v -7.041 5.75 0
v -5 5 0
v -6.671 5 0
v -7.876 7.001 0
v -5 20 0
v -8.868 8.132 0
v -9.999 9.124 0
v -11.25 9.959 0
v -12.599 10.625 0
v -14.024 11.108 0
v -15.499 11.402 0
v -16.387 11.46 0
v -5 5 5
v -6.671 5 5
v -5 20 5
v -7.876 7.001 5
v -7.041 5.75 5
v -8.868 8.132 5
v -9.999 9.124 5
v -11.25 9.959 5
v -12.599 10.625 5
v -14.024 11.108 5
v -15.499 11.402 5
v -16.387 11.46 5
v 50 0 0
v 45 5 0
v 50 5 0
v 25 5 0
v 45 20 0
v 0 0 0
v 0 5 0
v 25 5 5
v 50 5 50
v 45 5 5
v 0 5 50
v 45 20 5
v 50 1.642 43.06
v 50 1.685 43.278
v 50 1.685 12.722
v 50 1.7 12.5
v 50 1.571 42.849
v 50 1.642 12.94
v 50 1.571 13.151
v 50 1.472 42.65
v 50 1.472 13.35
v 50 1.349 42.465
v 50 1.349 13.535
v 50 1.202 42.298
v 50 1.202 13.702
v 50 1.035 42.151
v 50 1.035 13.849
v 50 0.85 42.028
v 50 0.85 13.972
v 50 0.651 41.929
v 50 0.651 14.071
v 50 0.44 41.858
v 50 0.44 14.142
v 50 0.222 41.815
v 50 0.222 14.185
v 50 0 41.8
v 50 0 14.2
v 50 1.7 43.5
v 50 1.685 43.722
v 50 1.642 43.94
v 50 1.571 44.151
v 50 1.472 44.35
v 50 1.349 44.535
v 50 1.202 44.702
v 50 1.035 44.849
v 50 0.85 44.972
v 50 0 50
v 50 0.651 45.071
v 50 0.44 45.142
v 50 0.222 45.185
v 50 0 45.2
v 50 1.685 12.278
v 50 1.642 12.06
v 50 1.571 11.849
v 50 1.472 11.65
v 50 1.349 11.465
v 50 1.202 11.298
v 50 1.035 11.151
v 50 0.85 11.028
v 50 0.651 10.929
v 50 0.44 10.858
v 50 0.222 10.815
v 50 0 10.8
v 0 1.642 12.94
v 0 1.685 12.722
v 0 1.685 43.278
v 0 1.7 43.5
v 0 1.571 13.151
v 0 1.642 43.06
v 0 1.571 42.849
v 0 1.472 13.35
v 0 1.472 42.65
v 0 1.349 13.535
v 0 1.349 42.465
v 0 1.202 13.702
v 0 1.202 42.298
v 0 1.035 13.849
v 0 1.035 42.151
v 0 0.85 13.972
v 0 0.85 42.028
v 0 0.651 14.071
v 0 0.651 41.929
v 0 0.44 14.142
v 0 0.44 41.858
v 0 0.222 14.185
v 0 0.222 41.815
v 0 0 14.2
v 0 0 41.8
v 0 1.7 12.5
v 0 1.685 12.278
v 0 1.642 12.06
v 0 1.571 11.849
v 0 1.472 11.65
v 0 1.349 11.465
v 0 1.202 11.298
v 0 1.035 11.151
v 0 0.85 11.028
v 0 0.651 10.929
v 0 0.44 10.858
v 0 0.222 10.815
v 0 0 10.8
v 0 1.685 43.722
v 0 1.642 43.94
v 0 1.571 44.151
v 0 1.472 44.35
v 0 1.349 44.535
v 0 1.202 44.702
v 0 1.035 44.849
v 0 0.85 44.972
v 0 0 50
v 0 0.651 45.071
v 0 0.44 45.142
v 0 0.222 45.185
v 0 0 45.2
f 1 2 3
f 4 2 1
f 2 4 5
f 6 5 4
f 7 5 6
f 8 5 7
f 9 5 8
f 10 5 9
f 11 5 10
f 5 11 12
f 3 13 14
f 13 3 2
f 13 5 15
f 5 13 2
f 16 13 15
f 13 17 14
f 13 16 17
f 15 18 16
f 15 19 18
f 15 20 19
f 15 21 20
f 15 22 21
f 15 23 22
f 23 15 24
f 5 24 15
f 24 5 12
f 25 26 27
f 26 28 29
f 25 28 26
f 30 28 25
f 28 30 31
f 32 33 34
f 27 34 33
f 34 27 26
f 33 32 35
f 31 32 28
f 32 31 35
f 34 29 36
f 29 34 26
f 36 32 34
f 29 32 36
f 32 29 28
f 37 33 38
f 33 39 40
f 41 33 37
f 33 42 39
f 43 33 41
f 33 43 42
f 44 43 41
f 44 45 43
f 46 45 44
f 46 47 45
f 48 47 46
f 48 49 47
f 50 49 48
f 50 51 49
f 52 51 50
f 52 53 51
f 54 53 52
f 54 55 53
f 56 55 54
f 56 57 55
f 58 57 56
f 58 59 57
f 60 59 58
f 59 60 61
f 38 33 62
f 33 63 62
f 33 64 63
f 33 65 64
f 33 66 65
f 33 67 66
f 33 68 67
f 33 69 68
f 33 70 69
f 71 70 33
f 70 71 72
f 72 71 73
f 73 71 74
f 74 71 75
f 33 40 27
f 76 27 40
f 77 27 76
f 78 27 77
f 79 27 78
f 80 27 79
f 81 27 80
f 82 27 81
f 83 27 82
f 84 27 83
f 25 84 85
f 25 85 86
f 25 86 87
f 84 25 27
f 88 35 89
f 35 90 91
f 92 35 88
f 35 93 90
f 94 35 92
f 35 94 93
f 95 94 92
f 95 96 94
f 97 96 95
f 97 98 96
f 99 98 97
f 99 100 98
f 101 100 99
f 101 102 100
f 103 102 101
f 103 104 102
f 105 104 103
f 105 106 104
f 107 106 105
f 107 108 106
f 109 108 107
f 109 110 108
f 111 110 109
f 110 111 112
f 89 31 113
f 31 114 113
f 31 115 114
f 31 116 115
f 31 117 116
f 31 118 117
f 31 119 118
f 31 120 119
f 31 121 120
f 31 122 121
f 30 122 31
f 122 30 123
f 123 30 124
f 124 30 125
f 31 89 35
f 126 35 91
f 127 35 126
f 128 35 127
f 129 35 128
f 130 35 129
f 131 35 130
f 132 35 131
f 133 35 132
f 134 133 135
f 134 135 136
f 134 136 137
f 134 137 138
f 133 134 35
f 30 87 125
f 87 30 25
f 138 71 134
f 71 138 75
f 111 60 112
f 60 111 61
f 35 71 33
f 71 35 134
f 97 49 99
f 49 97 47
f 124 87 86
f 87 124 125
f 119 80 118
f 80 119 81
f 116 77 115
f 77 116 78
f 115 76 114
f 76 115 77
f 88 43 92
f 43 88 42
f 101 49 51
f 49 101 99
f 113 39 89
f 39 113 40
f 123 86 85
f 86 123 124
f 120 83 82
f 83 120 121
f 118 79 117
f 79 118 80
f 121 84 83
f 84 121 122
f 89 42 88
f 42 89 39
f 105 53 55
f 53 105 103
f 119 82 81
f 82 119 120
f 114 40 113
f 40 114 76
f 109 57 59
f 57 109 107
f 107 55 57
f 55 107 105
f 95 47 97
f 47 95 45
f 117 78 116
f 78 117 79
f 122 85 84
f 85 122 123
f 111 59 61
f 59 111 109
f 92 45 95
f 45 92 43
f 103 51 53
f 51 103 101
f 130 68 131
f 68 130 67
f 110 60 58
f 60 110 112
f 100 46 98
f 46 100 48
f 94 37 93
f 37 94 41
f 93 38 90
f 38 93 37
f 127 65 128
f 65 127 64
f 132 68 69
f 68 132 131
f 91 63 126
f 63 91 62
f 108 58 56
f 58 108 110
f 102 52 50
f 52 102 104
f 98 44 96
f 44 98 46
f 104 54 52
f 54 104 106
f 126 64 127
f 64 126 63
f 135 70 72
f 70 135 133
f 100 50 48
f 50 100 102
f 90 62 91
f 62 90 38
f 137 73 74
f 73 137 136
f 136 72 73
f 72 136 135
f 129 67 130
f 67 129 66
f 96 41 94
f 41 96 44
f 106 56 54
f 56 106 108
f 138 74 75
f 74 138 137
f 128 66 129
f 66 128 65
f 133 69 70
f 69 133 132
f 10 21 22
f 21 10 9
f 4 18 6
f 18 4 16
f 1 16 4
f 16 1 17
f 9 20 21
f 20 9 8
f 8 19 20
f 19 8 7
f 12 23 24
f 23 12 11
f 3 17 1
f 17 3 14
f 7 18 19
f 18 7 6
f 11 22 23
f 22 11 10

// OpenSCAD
// L-shaped mounting bracket for a NEMA 17 stepper motor (syringe pump, bench top). NOVEL general part.
//

base_d  = 50;
base_t  = 5;
reach   = 50;
screw_t = 3.4;

$fn = 48;

gusset_t = 5;

difference() {
    union() {
        cube([base_d, base_t, base_t]);              // base plate (square, not rectangular - the user's X range -25..25 is 50 mm)
        cube([base_d, base_t, reach]);               // vertical motor plate
        for (x = [-25, 25])
            translate([x, 0, 0])
                linear_extrude(base_t)
                    polygon([[0, 5], [20, 5], [20, 20]]);   // gussets: right triangle in the YZ plane, flush with the left/right edges
    }
    translate([-17, 0, -1]) cylinder(h = base_t + reach + 2, d = 23);                 // motor boss hole
    for (z = [28 - 15.5, 28 + 15.5])
        translate([0, 0, z]) rotate([0, 90, 0]) cylinder(h = base_t + reach + 2, d = screw_t);   // 2 x M3 screw holes (along Y)
}
